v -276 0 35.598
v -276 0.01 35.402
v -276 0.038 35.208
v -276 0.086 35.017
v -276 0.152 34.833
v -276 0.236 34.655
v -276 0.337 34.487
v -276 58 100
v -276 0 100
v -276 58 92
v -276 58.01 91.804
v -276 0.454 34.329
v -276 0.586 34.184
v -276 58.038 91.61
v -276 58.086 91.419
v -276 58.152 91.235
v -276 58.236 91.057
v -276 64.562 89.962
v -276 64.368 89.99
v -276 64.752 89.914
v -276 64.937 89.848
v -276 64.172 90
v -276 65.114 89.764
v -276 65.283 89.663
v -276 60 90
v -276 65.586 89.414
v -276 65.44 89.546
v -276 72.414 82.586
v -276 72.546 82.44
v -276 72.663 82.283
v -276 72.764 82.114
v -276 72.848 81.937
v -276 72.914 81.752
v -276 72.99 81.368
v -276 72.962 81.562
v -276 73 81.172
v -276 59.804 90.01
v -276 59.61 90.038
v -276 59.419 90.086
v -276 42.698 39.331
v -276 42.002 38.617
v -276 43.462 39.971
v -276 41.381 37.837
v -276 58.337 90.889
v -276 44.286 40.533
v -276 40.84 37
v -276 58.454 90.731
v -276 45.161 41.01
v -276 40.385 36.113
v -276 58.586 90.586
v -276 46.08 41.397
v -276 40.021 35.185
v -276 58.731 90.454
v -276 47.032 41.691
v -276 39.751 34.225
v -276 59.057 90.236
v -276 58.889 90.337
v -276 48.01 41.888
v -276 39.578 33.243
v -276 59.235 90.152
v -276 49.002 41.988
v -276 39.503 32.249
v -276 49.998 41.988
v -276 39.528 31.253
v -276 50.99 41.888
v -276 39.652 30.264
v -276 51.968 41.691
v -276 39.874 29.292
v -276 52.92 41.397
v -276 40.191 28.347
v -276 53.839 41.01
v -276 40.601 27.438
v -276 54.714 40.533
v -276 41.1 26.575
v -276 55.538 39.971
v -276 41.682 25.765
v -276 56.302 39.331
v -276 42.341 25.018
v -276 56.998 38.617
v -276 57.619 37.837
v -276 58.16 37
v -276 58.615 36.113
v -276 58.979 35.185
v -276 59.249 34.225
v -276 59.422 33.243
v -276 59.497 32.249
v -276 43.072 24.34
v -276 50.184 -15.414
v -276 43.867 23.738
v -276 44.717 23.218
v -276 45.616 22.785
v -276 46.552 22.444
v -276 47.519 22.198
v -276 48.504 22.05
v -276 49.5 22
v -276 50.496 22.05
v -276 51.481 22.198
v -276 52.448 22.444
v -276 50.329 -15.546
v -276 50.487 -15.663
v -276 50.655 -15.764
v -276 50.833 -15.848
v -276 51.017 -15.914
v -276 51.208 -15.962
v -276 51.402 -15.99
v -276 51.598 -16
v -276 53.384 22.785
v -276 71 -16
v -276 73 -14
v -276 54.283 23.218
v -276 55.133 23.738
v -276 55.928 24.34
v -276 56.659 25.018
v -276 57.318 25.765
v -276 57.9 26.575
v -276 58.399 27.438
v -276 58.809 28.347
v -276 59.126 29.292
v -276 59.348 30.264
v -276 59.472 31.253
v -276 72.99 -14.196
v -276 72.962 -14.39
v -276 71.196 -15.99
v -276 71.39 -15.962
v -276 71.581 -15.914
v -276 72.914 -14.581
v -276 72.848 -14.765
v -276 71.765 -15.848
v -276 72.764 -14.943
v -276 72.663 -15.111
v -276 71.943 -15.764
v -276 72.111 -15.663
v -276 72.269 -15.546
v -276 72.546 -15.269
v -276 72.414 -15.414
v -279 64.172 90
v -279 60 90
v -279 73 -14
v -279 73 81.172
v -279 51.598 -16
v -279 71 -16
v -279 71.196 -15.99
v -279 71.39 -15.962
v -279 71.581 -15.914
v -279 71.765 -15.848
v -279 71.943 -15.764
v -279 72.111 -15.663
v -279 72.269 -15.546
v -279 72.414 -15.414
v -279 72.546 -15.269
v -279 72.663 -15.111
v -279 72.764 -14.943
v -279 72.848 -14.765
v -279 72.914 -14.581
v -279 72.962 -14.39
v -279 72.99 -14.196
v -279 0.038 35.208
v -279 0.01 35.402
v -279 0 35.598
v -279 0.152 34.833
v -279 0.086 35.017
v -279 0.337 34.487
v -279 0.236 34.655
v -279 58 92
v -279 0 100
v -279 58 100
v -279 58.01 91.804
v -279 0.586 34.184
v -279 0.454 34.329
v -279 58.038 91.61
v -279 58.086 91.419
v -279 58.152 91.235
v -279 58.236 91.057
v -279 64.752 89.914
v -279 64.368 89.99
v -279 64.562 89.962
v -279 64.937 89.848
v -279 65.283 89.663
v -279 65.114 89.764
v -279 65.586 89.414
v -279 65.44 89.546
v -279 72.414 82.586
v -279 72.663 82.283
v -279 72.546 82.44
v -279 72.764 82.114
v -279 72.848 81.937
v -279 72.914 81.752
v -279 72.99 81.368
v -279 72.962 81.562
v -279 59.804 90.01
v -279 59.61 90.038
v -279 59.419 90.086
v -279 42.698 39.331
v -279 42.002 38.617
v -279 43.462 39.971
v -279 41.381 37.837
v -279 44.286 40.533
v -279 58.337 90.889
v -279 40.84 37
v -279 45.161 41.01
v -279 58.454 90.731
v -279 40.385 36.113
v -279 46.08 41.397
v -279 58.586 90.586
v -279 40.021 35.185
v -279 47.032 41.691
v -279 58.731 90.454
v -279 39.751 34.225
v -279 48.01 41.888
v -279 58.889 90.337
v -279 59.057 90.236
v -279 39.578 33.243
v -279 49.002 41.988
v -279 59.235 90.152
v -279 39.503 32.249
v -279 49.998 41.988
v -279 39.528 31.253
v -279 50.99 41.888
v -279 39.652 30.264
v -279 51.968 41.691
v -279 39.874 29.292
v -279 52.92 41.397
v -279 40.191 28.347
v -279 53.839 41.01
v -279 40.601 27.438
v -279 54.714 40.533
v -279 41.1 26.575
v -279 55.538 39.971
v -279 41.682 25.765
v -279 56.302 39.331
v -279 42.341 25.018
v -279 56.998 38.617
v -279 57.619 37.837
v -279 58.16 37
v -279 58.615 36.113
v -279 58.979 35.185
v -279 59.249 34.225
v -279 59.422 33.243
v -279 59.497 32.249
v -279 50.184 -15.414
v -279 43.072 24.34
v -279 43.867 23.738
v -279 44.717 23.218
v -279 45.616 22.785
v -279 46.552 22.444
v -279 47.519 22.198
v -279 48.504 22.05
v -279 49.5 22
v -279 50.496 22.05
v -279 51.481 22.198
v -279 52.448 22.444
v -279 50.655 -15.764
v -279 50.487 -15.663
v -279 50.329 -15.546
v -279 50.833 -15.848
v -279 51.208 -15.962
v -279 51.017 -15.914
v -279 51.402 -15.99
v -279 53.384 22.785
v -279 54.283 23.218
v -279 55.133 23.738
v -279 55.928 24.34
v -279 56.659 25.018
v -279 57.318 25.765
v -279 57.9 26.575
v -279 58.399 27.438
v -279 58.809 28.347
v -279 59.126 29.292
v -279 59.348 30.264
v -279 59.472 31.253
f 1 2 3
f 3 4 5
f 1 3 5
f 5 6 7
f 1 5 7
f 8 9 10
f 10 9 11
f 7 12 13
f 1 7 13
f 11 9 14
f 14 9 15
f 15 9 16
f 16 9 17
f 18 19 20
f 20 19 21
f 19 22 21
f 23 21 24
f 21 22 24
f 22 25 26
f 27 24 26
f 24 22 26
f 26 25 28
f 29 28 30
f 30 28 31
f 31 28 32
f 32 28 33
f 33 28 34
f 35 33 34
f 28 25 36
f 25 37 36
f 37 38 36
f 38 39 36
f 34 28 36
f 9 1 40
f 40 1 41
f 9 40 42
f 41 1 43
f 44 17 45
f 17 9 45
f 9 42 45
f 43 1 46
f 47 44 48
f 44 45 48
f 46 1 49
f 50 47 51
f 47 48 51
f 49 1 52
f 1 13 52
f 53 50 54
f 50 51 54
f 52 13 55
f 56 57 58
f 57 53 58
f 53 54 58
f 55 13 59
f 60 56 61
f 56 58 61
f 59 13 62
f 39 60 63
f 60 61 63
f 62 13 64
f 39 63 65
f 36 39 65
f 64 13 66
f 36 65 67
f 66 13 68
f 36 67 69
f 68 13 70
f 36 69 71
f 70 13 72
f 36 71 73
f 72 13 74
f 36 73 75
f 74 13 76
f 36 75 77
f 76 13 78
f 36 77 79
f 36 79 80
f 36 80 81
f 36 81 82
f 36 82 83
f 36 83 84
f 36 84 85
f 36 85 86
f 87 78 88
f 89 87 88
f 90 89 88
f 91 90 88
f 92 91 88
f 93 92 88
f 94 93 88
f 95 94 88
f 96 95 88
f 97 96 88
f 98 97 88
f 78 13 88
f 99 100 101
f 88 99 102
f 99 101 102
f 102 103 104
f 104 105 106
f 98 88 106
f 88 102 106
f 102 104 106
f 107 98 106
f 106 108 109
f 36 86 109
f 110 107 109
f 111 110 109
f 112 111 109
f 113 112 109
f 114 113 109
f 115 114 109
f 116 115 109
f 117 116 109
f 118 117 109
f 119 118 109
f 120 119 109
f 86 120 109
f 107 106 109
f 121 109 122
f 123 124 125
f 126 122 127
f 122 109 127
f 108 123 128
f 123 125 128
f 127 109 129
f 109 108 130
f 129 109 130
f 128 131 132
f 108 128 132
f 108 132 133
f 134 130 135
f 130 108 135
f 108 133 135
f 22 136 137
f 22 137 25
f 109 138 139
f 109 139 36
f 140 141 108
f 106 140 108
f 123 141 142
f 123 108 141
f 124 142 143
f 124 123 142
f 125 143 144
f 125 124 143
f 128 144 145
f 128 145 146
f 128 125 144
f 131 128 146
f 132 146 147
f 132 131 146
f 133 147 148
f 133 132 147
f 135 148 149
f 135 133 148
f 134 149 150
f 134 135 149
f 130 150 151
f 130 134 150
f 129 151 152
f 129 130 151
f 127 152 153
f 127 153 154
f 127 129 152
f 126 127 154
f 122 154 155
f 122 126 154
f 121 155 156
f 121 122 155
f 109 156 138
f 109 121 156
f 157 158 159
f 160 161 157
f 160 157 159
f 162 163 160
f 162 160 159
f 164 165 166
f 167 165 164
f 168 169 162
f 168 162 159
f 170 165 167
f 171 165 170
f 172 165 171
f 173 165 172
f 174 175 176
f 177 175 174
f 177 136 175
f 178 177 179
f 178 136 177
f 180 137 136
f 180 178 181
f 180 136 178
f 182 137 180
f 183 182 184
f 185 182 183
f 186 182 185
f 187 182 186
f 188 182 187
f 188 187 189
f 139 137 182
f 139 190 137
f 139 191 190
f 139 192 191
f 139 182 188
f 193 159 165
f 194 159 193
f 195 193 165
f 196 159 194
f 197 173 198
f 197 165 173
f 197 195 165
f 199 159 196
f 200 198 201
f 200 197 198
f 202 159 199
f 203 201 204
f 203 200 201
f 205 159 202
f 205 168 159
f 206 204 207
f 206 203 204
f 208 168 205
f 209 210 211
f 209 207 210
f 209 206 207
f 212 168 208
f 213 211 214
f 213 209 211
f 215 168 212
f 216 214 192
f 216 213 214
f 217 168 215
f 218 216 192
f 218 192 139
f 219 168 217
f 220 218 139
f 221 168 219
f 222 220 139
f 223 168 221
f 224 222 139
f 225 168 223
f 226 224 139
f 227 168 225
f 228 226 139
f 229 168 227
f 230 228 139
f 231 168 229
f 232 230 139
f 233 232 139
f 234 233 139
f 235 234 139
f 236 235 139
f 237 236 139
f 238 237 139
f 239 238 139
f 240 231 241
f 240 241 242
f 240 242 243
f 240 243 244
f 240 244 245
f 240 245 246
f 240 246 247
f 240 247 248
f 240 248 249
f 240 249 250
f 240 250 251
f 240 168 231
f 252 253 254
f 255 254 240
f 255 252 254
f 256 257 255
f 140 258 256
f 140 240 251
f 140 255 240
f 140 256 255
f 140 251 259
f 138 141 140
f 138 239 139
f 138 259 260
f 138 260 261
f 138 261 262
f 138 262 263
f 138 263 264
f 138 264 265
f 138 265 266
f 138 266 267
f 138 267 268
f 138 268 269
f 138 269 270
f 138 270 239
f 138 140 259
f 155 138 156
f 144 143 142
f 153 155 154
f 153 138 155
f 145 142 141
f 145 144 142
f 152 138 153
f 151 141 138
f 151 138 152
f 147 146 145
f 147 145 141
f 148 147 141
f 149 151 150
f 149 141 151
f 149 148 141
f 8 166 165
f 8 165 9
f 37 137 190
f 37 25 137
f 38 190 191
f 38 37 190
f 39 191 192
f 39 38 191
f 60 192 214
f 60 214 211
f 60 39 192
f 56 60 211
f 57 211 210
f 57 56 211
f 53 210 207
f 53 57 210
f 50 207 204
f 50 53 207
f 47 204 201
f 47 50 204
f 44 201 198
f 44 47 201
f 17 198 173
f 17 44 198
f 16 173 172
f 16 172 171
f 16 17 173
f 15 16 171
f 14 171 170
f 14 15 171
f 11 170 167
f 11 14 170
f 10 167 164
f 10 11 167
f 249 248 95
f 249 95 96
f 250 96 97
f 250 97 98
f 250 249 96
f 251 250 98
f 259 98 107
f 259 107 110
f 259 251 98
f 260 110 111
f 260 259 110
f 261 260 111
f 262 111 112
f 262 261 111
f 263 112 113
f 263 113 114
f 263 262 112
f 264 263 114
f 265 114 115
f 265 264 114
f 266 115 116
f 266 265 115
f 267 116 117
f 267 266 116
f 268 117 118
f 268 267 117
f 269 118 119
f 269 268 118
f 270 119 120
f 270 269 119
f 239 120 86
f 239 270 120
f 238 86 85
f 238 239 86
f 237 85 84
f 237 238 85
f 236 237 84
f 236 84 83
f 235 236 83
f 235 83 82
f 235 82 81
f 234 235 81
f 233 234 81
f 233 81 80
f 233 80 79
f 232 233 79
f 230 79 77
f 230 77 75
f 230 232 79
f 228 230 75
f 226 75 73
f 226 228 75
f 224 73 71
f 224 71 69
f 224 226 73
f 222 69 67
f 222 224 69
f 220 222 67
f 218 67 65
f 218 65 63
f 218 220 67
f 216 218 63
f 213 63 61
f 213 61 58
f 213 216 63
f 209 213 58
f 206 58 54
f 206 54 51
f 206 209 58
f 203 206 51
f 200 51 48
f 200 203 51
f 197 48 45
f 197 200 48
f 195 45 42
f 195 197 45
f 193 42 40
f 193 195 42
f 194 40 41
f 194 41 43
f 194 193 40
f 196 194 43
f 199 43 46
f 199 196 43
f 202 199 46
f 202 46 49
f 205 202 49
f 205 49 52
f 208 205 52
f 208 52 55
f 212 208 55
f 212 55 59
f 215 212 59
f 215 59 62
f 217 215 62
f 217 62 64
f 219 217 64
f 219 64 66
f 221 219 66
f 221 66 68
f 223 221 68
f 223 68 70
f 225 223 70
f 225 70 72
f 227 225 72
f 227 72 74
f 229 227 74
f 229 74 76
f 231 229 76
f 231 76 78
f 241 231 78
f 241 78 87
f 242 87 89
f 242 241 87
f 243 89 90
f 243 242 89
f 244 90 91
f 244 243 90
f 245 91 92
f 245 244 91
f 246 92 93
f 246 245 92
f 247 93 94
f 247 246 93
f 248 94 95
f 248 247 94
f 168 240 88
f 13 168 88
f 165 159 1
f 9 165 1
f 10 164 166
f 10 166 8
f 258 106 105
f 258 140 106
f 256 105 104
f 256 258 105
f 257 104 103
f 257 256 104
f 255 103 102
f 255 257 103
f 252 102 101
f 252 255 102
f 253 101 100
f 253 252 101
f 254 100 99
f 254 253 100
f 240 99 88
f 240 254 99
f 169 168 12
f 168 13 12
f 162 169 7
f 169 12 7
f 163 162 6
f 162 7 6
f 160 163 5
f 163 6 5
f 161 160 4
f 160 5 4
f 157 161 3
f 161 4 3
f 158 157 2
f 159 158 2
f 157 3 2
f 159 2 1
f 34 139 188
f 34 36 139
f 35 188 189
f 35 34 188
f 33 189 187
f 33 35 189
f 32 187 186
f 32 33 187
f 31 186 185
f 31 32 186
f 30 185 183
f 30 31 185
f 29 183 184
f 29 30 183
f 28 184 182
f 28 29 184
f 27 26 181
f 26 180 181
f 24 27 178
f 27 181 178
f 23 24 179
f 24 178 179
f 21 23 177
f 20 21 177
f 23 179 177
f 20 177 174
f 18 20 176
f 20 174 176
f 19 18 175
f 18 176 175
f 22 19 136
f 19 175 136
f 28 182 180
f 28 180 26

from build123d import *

# Parameters (mm, degrees)
CYLINDER012029001057_R       = 10
CYLINDER012029001057_DEPTH   = 3
BOX015001045_W               = 3
BOX015001045_H               = 12
BOX015001045_DEPTH           = 27
BOX015001045_PLACEMENT_ANGLE = 45
BOX015001046_W               = 3
BOX015001046_H               = 26
BOX015001046_DEPTH           = 76
BOX015001046_PLACEMENT_ANGLE = 45
BOX015001044_W               = 3
BOX015001044_H               = 39
BOX015001044_DEPTH           = 106
BOX015001042_W               = 3
BOX015001042_H               = 58
BOX015001042_DEPTH           = 100
FILLET004002003_R            = 2


with BuildPart() as cylinder012029001047:
    # Cylinder012029001057 → Cylinder012029001057 (new body)
    with BuildSketch(Plane(origin=(-279, 49.5, 32), x_dir=(0, 0, -1), z_dir=(1, 0, 0))):
        Circle(CYLINDER012029001057_R)
    extrude(amount=CYLINDER012029001057_DEPTH)


with BuildPart() as cube041:
    # Box015001045 → Box015001045 (new body)
    with BuildSketch(Plane.XY):
        with Locations((1.5, 6)):
            Rectangle(BOX015001045_W, BOX015001045_H)
    extrude(amount=BOX015001045_DEPTH)


with BuildPart() as cube041_1:
    # Box015001045 placement: moved
    add(cube041.part.moved(Location((-279, 84, 71))).rotate(Axis((-279, 84, 71), (1, 0, 0)), BOX015001045_PLACEMENT_ANGLE))


with BuildPart() as cube042:
    # Box015001046 → Box015001046 (new body)
    with BuildSketch(Plane.XY):
        with Locations((1.5, 13)):
            Rectangle(BOX015001046_W, BOX015001046_H)
    extrude(amount=BOX015001046_DEPTH)


with BuildPart() as cube042_1:
    # Box015001046 placement: moved
    add(cube042.part.moved(Location((-279, 33, -35))).rotate(Axis((-279, 33, -35), (1, 0, 0)), BOX015001046_PLACEMENT_ANGLE))


with BuildPart() as cube040:
    # Box015001044 → Box015001044 (new body)
    with BuildSketch(Plane(origin=(-279, 34, -16), x_dir=(1, 0, 0), z_dir=(0, 0, 1))):
        with Locations((1.5, 19.5)):
            Rectangle(BOX015001044_W, BOX015001044_H)
    extrude(amount=BOX015001044_DEPTH)


with BuildPart() as fillet004002003:
    # Box015001042 → Box015001042 (new body)
    with BuildSketch(Plane(origin=(-279, 0, 0), x_dir=(1, 0, 0), z_dir=(0, 0, 1))):
        with Locations((1.5, 29)):
            Rectangle(BOX015001042_W, BOX015001042_H)
    extrude(amount=BOX015001042_DEPTH)

    # Fusion001019007002: union Cube040
    add(cube040.part)

    # Cut003049: cut Cube042
    add(cube042_1.part, mode=Mode.SUBTRACT)

    # Cut003050: cut Cube041
    add(cube041_1.part, mode=Mode.SUBTRACT)

    # Cut003051: cut Cylinder012029001047
    add(cylinder012029001047.part, mode=Mode.SUBTRACT)

    # Fillet004002003
    fillet004002003_edges = [fillet004002003.edges().sort_by_distance(p)[0] for p in [
        (-277.5, 58, 90),
        (-277.5, 0, 34.769553),
        (-277.5, 50.769553, -16),
        (-277.5, 65, 90),
        (-277.5, 73, -16),
        (-277.5, 73, 82),
    ]]
    fillet(fillet004002003_edges, radius=FILLET004002003_R)


solid = fillet004002003.part
